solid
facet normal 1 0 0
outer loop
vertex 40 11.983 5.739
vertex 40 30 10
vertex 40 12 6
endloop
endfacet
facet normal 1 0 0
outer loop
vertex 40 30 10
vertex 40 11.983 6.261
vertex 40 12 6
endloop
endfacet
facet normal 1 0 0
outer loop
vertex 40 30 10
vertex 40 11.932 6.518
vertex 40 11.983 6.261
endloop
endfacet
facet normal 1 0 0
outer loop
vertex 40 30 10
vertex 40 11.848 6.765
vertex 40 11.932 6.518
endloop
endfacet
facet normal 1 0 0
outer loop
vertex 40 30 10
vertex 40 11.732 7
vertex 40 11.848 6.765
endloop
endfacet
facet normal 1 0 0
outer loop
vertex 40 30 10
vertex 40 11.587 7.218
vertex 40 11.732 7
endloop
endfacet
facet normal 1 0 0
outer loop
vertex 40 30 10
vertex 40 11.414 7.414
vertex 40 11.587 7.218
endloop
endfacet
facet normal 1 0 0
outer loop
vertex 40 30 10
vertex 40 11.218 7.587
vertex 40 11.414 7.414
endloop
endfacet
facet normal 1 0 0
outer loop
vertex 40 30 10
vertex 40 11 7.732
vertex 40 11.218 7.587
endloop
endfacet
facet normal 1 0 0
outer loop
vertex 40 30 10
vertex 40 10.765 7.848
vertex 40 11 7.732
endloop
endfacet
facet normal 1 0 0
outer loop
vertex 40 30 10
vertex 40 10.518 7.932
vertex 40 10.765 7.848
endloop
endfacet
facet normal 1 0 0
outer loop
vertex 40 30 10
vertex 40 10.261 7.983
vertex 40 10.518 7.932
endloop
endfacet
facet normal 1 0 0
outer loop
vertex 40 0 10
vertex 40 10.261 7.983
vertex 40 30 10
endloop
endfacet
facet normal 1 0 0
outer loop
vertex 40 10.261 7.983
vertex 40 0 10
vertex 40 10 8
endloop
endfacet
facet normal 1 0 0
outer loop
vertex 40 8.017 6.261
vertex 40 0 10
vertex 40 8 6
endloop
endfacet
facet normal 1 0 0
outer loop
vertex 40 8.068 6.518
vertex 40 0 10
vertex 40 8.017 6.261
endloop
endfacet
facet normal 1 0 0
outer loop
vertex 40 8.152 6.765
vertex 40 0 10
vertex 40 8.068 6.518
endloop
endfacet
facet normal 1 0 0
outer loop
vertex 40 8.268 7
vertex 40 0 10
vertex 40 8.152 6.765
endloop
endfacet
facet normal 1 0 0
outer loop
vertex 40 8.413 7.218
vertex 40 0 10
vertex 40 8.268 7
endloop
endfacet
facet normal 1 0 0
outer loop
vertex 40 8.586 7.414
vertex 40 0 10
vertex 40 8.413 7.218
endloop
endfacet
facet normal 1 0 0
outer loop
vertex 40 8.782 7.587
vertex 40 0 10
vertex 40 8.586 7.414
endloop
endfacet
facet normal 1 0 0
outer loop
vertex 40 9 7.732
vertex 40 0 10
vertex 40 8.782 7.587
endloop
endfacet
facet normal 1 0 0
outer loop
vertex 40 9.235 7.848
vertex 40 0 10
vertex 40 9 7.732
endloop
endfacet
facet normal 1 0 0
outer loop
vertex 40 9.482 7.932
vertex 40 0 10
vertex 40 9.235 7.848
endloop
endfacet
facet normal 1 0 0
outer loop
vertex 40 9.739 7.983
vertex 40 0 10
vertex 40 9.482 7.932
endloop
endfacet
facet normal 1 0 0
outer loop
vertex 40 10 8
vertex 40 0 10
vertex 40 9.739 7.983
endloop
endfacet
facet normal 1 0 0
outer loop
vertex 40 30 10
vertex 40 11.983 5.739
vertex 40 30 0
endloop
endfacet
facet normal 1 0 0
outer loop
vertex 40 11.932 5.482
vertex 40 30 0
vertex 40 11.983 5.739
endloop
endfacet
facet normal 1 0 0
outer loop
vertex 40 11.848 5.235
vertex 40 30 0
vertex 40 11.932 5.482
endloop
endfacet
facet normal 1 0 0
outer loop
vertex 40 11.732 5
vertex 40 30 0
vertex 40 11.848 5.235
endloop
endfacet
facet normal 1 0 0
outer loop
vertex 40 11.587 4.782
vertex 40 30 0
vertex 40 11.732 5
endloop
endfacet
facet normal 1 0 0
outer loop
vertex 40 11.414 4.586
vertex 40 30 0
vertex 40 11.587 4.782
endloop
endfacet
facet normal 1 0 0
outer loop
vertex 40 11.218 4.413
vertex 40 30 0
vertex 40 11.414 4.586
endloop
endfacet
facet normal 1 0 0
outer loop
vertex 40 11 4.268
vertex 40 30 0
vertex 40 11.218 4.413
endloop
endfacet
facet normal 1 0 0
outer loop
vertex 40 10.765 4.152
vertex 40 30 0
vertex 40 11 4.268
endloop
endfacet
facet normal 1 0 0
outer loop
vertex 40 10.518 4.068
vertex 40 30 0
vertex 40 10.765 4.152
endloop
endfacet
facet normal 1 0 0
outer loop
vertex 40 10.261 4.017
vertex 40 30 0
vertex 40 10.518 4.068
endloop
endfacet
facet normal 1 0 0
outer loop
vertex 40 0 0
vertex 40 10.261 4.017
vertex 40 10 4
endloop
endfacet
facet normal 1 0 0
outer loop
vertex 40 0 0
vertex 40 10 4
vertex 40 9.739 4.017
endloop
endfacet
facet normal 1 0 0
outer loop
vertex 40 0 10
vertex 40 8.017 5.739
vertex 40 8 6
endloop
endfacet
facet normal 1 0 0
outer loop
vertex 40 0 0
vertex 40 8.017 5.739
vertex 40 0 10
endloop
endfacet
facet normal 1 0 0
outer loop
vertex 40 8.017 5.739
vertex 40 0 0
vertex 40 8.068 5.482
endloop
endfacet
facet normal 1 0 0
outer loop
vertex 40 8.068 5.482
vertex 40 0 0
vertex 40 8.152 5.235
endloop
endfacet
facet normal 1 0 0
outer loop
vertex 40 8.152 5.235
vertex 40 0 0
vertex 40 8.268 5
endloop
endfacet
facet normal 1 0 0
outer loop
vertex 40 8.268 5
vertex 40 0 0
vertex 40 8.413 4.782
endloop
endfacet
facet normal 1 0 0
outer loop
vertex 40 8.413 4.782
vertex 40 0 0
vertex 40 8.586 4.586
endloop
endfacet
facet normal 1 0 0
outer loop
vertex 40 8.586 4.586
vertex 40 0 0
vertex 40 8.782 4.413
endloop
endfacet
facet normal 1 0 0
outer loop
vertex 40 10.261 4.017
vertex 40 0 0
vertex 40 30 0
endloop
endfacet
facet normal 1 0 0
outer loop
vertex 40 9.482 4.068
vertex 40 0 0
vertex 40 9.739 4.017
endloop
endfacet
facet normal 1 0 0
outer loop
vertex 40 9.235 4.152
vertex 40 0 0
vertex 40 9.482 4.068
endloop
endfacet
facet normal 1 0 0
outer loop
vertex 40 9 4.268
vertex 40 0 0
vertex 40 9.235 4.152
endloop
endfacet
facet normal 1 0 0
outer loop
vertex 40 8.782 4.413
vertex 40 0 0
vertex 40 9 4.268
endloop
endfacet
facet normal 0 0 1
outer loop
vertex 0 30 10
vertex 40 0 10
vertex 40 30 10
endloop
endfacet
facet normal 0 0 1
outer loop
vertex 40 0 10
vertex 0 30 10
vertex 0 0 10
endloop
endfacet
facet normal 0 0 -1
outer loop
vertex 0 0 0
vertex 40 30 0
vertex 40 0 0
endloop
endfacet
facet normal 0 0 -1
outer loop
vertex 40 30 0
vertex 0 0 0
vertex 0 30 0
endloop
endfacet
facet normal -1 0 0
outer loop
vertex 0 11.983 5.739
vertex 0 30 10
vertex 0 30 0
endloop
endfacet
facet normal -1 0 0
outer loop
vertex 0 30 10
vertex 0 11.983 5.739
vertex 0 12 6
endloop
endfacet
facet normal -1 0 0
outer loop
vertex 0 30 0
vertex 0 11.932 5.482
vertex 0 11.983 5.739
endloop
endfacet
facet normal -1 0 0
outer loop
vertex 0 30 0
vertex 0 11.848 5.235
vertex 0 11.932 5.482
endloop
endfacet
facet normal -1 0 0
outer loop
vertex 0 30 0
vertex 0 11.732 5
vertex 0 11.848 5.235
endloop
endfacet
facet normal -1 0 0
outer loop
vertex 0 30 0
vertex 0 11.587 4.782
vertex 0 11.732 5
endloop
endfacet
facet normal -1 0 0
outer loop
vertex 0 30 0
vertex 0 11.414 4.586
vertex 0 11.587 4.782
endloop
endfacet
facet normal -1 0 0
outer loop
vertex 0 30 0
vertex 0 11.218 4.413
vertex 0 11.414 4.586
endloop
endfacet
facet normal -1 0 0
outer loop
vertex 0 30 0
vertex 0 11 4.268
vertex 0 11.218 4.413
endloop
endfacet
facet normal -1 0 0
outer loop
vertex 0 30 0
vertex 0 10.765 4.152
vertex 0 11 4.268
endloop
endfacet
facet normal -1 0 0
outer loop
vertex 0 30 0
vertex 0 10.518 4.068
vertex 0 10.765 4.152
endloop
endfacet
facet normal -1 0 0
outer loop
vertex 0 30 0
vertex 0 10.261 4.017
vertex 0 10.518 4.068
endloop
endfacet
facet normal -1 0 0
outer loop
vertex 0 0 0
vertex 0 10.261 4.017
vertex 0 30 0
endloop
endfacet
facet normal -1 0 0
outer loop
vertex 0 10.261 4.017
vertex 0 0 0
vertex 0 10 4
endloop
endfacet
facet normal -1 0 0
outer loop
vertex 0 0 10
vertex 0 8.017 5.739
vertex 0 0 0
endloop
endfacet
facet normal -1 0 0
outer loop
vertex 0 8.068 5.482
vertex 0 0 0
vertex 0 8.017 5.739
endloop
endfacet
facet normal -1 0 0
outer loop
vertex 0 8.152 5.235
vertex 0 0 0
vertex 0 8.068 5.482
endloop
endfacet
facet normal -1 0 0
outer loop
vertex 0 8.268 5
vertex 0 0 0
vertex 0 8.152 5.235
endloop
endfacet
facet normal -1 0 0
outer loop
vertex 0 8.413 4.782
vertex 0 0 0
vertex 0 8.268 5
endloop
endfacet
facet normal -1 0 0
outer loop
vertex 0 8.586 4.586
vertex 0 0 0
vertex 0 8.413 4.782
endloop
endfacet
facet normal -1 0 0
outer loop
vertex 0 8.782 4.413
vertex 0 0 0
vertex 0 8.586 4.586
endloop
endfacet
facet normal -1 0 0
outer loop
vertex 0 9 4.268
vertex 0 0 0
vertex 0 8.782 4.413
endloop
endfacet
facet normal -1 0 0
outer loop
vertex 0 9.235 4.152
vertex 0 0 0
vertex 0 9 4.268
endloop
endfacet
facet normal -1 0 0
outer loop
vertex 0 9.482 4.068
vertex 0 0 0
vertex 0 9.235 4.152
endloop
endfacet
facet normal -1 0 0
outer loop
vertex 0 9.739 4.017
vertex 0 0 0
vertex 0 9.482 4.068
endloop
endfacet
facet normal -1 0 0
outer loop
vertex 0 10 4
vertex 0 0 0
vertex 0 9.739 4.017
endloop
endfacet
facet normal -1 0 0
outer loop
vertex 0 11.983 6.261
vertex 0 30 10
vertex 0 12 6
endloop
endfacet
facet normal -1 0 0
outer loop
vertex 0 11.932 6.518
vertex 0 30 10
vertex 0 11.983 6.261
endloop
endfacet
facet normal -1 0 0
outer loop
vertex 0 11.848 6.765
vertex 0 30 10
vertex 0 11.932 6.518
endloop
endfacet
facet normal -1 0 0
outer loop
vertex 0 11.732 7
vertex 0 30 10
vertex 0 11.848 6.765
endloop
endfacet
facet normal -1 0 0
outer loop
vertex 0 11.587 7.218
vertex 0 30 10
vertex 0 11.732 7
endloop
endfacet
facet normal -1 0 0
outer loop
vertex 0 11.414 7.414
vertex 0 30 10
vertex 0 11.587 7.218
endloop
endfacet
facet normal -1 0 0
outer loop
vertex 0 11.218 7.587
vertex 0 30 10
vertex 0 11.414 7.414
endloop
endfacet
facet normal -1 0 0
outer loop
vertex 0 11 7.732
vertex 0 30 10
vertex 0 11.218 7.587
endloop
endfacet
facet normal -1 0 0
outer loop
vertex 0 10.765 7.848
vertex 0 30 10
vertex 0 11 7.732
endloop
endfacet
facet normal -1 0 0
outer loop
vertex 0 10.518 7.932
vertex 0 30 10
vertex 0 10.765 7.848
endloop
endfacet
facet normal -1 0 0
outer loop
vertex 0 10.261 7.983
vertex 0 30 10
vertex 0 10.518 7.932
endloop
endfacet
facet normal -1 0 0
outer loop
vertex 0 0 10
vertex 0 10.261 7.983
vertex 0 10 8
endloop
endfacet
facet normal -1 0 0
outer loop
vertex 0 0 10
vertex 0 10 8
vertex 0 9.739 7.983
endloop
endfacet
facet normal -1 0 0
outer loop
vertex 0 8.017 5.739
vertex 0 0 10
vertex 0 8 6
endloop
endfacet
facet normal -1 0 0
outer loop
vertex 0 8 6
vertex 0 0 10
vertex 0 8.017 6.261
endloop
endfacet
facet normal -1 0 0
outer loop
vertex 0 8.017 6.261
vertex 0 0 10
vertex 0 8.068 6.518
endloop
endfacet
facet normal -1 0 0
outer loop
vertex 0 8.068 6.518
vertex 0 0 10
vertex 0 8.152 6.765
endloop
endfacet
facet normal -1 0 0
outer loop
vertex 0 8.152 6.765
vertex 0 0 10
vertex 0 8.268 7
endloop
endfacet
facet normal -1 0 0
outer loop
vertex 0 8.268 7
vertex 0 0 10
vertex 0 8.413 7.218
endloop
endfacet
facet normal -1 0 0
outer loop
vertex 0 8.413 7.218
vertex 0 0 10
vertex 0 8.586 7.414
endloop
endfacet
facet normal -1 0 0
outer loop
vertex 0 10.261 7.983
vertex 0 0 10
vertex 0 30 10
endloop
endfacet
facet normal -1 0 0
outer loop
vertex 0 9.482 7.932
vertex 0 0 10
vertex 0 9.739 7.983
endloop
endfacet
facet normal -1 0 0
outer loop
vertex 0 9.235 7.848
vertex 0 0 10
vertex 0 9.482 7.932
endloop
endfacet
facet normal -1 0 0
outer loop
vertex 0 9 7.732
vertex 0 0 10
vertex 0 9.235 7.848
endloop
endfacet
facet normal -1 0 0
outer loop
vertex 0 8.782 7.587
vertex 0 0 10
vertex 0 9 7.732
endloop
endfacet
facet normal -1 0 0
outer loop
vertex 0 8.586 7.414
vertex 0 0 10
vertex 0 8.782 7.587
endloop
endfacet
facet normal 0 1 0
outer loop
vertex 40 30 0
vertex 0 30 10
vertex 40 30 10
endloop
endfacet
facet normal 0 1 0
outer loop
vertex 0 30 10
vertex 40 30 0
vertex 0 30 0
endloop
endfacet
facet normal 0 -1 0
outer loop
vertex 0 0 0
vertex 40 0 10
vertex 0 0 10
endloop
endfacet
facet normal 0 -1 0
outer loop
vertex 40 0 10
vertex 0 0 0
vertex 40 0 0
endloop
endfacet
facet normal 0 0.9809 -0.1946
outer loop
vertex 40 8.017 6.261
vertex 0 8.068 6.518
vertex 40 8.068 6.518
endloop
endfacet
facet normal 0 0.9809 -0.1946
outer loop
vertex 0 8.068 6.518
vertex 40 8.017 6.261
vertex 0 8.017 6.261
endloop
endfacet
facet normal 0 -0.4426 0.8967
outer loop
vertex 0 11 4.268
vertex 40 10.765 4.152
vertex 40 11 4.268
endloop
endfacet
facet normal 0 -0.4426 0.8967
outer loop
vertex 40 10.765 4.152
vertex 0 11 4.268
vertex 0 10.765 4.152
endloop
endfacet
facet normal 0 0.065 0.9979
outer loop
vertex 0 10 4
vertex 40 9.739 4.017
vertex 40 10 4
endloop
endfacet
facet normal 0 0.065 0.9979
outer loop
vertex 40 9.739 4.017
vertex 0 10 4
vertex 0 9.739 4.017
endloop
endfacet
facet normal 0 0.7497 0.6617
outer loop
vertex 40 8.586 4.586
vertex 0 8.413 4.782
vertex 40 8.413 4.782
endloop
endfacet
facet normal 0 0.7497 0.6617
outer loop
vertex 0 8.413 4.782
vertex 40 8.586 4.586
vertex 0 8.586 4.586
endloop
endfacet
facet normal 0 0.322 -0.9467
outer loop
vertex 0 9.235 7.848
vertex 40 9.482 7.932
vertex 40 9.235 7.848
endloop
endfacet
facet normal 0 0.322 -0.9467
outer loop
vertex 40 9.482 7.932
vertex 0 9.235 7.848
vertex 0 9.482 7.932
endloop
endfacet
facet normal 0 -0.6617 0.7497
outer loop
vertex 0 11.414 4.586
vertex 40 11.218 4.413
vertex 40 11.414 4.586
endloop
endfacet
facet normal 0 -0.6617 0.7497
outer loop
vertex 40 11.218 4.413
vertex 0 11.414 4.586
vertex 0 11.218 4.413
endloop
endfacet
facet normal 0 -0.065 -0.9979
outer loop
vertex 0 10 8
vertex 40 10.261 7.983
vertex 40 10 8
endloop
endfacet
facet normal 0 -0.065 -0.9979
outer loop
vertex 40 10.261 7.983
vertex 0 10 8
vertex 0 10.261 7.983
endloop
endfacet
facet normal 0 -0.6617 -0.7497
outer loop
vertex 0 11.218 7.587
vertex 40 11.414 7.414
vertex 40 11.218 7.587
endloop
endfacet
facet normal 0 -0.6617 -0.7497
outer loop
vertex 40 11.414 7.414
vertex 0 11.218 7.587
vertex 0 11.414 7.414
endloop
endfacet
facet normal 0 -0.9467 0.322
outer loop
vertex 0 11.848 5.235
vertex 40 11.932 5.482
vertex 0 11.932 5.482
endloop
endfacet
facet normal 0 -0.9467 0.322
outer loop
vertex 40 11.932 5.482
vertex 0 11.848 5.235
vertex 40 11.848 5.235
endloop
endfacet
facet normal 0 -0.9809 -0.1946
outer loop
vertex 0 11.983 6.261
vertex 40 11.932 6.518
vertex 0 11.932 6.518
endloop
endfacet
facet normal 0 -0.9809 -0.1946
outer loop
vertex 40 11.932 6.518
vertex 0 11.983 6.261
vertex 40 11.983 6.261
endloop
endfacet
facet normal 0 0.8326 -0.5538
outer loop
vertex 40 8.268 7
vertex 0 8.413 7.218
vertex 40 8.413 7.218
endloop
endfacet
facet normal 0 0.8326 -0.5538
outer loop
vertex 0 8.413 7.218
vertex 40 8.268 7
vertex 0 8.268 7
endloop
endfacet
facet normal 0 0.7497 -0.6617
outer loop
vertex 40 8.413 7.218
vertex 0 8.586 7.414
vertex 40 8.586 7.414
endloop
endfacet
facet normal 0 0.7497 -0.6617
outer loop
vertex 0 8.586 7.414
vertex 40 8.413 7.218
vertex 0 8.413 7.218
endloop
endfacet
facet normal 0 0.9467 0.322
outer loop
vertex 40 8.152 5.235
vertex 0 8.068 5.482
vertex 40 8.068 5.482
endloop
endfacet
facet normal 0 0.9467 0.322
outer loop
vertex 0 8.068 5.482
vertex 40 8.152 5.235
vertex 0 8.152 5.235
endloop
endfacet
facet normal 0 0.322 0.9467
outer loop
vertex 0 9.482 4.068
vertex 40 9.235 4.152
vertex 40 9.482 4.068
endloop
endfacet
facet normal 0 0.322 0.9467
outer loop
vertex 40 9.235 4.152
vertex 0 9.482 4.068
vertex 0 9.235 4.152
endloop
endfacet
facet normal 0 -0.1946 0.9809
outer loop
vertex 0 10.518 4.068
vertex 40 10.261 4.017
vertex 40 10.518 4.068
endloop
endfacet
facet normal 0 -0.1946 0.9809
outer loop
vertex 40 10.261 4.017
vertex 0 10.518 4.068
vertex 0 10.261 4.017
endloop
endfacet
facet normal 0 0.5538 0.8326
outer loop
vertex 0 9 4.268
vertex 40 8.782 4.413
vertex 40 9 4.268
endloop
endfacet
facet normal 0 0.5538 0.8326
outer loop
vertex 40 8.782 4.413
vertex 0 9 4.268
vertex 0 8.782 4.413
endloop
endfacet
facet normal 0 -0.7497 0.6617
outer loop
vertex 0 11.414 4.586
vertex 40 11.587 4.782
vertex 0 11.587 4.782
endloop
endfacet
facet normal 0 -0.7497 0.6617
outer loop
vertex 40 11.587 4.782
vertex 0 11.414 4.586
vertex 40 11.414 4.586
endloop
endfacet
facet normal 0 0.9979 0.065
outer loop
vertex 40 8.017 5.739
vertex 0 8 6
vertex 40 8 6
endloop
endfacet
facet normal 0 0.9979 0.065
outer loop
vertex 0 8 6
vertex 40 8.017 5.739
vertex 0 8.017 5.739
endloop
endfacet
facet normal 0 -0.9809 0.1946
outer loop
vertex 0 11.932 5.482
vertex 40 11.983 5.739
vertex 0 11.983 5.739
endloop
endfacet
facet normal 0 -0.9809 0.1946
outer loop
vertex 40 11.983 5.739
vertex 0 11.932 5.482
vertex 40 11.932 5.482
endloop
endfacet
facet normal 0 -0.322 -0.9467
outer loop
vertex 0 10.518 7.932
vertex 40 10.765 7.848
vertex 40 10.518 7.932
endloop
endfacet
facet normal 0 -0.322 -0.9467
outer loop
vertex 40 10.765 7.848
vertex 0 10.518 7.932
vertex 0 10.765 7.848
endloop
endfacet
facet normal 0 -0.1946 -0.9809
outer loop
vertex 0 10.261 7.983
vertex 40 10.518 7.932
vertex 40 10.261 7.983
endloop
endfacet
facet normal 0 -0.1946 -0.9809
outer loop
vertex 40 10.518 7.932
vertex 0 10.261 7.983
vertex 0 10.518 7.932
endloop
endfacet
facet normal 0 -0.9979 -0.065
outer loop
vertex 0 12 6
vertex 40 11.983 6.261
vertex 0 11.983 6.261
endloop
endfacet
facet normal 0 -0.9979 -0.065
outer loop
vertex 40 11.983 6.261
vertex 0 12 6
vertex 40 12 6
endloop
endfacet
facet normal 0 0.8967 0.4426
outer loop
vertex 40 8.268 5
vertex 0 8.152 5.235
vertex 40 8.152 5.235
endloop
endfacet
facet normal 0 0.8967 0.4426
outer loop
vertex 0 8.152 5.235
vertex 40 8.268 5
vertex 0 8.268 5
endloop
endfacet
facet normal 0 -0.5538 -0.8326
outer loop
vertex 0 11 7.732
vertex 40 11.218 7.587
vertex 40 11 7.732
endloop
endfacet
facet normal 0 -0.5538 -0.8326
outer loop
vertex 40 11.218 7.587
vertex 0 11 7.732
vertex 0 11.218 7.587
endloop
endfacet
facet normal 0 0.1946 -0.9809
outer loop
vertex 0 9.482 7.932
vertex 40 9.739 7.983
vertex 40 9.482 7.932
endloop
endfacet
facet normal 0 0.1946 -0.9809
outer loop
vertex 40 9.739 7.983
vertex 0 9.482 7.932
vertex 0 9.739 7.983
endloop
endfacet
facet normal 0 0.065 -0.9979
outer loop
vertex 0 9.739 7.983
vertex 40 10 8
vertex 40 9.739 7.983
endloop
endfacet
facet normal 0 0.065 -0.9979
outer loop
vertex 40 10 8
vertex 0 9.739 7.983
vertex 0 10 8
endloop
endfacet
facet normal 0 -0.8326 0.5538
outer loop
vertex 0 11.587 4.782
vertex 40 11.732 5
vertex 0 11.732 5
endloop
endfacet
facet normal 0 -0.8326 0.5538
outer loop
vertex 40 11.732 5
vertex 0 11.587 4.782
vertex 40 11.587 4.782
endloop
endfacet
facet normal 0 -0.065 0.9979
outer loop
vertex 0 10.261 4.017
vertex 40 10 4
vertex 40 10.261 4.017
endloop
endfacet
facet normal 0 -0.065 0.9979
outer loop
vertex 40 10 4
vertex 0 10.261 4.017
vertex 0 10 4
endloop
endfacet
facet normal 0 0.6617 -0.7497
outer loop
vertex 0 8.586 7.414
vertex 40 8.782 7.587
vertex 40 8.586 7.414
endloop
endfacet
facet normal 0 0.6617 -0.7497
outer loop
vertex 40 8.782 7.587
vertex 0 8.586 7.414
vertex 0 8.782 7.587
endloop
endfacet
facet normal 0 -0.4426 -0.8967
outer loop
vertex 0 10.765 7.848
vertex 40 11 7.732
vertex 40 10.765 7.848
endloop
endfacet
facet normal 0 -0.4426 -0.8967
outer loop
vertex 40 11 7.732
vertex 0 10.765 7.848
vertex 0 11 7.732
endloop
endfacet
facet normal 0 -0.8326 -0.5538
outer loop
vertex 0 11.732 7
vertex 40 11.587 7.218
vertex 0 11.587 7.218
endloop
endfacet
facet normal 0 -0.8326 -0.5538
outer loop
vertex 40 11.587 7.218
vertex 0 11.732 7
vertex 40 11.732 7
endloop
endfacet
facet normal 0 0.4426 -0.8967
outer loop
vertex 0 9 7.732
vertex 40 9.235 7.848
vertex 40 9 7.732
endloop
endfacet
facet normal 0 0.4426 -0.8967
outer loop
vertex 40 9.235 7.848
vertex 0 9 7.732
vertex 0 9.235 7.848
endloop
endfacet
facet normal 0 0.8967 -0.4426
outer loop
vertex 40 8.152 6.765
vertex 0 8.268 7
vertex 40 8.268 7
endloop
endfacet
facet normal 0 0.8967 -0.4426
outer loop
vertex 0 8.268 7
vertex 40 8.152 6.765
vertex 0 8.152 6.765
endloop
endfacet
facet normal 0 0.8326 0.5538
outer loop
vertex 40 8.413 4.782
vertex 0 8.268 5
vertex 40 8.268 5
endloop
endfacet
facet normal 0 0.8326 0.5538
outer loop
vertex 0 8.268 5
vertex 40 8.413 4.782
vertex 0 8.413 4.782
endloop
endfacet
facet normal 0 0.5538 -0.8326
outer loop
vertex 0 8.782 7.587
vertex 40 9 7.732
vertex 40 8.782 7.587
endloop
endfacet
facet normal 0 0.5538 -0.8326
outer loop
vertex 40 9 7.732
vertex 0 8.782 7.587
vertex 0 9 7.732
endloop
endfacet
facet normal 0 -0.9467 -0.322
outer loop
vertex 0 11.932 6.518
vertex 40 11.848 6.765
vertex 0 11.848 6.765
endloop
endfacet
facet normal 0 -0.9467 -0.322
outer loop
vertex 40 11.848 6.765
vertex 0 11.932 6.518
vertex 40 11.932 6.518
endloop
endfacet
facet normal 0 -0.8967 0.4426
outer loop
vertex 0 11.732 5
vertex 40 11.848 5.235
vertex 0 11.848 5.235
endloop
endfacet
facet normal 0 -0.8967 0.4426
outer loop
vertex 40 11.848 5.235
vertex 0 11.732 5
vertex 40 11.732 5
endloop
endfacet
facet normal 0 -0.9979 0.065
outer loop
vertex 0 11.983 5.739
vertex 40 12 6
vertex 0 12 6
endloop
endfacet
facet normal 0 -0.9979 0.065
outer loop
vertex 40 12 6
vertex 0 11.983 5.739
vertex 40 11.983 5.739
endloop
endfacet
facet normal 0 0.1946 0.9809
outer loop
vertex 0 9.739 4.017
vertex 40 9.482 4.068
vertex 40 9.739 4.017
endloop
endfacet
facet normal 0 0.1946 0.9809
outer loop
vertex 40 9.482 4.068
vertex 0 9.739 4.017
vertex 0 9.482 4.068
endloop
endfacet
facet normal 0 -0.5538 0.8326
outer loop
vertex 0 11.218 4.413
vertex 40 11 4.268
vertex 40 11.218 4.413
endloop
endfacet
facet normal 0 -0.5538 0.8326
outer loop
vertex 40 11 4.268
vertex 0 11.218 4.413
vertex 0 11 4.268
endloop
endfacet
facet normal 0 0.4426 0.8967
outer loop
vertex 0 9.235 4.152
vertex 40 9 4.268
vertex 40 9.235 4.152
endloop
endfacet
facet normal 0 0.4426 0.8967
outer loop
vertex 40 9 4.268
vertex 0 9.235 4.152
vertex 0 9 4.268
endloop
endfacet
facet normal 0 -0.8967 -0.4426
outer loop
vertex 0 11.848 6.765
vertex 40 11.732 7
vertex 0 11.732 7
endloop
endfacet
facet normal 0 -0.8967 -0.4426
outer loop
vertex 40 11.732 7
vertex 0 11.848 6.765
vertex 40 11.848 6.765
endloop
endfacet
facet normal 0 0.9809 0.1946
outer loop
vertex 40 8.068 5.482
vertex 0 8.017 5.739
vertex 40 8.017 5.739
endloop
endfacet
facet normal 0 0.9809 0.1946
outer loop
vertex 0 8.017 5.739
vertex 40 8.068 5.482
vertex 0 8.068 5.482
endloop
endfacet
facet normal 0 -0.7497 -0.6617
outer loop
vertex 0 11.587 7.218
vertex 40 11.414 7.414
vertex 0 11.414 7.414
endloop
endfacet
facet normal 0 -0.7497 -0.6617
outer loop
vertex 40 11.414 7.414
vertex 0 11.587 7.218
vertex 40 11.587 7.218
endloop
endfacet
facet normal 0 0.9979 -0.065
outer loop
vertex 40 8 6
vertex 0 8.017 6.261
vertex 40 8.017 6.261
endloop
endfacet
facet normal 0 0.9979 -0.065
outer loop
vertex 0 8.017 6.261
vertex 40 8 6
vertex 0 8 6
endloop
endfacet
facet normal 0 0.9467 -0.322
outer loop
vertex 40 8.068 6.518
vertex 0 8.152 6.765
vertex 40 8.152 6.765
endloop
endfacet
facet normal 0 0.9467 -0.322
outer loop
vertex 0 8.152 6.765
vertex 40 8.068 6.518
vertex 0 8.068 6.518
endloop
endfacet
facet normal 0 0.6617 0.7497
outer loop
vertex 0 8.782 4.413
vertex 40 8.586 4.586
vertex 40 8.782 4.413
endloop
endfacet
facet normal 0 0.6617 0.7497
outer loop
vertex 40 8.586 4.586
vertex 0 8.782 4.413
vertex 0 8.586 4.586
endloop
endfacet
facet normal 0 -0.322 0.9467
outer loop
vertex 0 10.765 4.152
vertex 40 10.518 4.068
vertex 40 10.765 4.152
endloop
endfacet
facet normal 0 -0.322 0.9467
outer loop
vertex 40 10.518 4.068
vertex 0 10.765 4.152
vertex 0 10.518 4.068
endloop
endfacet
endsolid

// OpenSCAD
// units=mm — generated by scad_emitter.py
// part=unnamed
$fn = 48;

difference() { cube([40, 30, 10]); translate([40.5, 10, 6]) rotate([0, -90, 0]) cylinder(h=41, r=2, $fn=$fn); }
